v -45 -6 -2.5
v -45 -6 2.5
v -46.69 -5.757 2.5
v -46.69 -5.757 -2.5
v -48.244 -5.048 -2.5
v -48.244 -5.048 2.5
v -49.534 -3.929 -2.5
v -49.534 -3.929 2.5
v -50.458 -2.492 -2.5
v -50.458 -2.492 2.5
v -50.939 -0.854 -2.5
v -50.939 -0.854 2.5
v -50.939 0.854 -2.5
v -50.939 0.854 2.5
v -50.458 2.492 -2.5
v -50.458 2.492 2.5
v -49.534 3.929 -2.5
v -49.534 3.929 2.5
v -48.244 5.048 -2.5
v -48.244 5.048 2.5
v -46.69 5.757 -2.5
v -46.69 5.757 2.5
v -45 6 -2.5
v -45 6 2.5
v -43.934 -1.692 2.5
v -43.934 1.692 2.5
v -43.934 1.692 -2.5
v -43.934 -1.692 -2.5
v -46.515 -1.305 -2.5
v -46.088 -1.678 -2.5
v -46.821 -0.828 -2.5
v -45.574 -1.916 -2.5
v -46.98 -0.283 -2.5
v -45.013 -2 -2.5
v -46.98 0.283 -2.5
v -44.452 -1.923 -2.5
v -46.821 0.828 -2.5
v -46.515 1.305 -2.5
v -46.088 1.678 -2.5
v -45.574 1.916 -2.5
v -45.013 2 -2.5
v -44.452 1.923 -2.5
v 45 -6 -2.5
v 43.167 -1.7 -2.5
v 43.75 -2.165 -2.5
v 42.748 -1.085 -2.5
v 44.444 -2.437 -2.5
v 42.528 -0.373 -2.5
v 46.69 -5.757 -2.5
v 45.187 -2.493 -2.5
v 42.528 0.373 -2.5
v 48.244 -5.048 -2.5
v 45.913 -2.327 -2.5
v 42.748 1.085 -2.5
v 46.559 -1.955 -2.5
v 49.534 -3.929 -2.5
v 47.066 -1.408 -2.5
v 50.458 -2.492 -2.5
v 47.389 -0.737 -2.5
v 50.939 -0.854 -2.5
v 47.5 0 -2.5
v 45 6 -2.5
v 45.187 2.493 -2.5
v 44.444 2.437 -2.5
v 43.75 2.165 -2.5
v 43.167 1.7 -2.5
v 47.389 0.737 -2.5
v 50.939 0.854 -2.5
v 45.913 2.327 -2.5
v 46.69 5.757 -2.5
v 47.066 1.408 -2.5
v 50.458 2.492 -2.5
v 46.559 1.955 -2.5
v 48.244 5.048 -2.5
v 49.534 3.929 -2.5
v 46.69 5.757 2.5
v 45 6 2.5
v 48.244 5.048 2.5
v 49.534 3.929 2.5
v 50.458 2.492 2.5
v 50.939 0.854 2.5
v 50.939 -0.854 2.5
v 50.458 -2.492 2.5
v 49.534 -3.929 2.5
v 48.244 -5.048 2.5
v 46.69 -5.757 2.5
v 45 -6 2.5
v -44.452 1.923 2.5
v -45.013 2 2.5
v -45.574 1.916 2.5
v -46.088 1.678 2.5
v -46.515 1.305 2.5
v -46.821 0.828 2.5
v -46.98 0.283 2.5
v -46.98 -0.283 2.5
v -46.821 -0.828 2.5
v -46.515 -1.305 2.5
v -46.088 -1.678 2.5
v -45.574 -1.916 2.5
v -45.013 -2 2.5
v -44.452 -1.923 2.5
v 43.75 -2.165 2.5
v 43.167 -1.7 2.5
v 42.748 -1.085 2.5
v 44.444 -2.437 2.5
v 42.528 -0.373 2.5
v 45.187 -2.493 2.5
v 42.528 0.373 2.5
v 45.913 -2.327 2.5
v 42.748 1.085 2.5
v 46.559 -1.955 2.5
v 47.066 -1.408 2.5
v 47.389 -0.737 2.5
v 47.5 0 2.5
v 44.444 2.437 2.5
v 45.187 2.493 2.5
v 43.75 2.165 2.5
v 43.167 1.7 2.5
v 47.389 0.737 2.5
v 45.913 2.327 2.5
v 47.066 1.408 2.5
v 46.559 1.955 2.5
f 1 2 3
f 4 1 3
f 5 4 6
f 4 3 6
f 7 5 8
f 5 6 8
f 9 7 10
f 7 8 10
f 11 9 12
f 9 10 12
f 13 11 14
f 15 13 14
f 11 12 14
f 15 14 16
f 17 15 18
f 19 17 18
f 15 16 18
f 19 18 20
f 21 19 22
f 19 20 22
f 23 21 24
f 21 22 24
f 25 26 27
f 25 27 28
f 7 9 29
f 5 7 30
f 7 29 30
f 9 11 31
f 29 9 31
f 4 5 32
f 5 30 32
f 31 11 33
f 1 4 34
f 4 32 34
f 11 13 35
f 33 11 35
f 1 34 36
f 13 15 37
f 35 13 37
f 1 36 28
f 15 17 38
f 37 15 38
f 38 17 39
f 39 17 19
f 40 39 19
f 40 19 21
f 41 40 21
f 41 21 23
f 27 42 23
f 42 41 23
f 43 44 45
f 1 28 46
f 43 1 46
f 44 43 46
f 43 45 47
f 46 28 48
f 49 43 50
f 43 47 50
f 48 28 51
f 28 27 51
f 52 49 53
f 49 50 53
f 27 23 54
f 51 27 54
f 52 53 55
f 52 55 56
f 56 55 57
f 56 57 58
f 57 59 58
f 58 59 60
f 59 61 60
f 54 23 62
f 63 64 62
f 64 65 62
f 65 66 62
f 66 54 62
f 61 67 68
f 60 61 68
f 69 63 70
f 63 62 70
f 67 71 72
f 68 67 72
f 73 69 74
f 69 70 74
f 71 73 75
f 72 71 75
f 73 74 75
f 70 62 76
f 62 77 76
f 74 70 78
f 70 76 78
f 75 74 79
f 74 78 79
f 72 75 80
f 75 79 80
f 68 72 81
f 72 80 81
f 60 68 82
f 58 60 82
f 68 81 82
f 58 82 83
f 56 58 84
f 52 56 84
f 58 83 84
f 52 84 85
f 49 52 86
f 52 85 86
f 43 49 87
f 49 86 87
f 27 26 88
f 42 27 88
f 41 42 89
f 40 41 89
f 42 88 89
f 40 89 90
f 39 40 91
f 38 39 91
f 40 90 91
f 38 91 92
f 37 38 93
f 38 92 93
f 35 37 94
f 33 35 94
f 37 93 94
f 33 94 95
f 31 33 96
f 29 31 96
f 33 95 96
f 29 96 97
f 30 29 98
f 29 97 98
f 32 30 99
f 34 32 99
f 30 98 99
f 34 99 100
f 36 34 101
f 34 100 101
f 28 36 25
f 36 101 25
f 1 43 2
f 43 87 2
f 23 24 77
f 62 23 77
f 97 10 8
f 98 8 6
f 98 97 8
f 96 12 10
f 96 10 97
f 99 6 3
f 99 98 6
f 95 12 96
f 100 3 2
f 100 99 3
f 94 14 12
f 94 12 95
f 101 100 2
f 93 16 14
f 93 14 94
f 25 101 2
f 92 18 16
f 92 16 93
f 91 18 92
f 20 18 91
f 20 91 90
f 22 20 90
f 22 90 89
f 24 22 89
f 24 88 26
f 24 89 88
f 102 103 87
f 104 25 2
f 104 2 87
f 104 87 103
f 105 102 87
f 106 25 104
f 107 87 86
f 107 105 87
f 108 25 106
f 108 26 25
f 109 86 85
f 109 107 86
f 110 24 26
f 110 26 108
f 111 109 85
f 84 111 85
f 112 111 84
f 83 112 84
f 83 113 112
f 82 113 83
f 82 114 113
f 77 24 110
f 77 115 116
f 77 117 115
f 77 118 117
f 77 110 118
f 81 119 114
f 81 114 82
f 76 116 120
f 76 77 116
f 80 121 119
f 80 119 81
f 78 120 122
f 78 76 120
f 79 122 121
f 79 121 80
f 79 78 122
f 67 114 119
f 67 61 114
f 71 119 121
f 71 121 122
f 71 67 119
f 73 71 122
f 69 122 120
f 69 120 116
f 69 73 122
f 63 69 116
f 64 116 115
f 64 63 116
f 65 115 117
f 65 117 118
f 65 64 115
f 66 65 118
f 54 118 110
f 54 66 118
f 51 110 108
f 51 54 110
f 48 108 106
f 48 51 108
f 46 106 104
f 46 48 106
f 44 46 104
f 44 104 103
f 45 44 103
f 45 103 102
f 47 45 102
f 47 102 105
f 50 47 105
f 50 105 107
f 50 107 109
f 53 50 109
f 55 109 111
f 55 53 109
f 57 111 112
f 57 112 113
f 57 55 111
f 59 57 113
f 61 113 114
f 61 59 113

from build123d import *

# Parameters (mm, degrees)
CROQUIS1_R              = 2.5
SALIENTE_EXTRUIR1_DEPTH = 2.5
CROQUIS3_R              = 2.5
CROQUIS3_R_2            = 2
SALIENTE_EXTRUIR7_DEPTH = 5


with BuildPart() as part:
    # Croquis1 → Saliente-Extruir1 (new, symmetric)
    with BuildSketch(Plane.XY):
        with BuildLine():
            Line((-45, 6), (45, 6))
            ThreePointArc((45, 6), (51, 0), (45, -6))
            Line((45, -6), (-45, -6))
            ThreePointArc((-45, -6), (-51, 0), (-45, 6))
        make_face()
        with Locations((45, 0)):
            Circle(CROQUIS1_R, mode=Mode.SUBTRACT)
        with Locations((-45, 0)):
            Circle(CROQUIS1_R, mode=Mode.SUBTRACT)
    extrude(amount=SALIENTE_EXTRUIR1_DEPTH, both=True)

    # Croquis3 → Saliente-Extruir7 (add, through all)
    # profile 1 of 2: a face of its own
    with BuildSketch(Plane.XY.offset(2.5)):
        with Locations((-45, 0)):
            Circle(CROQUIS3_R)
        with Locations((-45, 0)):
            Circle(CROQUIS3_R_2, mode=Mode.SUBTRACT)
    # profile 2 of 2: a face of its own
    with BuildSketch(Plane.XY.offset(2.5)):
        with BuildLine():
            Line((-43.934051012, 1.692262614), (-43.934051012, 0))
            Line((-43.934051012, 0), (-43.934051012, -1.692262614))
            ThreePointArc((-43.934051012, -1.692262614), (-43.249014852, -0.966463146), (-43, 0))
            ThreePointArc((-43, 0), (-43.249014852, 0.966463146), (-43.934051012, 1.692262614))
        make_face()
    extrude(amount=-SALIENTE_EXTRUIR7_DEPTH)


solid = part.part
